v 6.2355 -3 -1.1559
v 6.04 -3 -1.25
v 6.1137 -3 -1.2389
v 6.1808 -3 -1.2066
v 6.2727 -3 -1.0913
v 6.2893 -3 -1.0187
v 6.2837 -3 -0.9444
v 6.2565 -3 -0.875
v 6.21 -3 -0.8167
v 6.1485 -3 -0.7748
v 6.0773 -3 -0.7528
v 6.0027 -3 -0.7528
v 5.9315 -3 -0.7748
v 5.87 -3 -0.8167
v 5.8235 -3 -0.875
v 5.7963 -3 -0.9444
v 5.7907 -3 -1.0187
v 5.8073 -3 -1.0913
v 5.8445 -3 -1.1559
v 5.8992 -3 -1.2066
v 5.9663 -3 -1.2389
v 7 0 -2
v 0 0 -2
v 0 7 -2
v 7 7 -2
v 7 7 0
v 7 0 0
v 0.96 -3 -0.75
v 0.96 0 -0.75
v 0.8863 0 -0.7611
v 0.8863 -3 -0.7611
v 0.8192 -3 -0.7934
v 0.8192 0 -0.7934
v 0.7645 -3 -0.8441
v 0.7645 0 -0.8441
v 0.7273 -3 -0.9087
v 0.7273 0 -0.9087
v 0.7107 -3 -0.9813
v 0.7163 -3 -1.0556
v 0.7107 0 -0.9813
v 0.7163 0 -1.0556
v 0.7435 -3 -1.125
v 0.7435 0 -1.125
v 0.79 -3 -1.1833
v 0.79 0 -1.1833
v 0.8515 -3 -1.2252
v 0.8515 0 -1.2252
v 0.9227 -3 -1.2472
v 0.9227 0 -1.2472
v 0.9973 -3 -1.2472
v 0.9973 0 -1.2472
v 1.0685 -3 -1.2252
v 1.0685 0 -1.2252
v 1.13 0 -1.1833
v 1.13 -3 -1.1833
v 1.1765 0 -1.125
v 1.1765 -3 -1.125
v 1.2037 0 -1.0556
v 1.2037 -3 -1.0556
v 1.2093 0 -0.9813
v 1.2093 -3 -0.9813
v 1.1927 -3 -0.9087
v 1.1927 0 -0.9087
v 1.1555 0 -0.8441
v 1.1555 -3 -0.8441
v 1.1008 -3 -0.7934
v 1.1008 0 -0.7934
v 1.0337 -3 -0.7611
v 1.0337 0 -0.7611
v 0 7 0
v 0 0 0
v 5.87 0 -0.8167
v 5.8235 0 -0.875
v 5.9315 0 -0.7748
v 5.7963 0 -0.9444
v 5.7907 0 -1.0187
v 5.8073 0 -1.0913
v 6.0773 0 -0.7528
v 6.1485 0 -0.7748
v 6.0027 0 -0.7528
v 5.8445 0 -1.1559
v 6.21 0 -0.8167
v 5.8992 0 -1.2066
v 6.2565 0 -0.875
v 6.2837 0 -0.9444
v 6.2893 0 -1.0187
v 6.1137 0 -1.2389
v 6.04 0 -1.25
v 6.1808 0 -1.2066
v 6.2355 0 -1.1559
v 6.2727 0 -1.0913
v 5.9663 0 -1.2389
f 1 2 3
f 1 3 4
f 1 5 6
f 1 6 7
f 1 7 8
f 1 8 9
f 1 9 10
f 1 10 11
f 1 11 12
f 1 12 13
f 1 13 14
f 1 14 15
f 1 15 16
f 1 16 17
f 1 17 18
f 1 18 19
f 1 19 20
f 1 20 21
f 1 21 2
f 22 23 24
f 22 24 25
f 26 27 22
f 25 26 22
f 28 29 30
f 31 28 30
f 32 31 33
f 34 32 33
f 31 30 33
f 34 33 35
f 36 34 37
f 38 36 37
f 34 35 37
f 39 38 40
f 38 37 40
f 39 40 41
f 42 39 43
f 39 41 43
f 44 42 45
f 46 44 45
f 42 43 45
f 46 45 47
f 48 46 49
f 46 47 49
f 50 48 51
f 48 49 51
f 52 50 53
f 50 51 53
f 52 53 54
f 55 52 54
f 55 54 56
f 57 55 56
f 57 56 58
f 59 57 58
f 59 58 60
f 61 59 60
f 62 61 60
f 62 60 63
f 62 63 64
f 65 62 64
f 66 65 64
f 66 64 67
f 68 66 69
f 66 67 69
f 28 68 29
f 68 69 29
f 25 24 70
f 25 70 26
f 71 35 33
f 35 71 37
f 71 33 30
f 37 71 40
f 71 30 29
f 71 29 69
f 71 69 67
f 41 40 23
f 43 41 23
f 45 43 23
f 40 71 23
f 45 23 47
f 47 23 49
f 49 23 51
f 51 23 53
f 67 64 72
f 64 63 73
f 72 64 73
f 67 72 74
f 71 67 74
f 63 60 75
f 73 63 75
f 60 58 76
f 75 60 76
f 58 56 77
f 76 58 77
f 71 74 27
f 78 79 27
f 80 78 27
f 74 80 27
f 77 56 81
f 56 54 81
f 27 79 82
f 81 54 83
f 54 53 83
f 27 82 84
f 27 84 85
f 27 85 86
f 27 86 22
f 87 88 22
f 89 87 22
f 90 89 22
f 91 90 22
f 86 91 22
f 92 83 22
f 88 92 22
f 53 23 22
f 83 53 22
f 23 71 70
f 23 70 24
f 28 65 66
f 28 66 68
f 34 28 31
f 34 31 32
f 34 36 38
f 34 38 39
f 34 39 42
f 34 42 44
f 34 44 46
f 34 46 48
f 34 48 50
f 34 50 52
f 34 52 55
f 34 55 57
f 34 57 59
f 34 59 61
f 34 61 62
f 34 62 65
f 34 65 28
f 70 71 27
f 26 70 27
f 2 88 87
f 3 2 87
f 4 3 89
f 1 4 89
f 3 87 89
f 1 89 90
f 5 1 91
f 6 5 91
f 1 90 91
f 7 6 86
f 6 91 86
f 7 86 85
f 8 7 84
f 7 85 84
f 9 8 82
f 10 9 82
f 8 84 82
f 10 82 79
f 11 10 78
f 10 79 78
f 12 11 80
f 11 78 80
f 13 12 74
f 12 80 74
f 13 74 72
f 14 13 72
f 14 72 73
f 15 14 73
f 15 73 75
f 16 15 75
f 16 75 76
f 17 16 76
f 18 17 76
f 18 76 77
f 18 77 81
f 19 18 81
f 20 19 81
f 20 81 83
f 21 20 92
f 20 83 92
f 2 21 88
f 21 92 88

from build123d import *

# Parameters (mm, degrees)
ESQUISSE1_W      = 7
ESQUISSE1_H      = 2
EXTRUSION1_DEPTH = 7
ESQUISSE2_R      = 0.25
EXTRUSION2_DEPTH = 3


with BuildPart() as part:
    # Esquisse1 → Extrusion1 (new body)
    with BuildSketch(Plane(origin=(0, 0, 0), x_dir=(1, 0, 0), z_dir=(0, 1, 0))):
        with Locations((3.5, 1)):
            Rectangle(ESQUISSE1_W, ESQUISSE1_H)
    extrude(amount=EXTRUSION1_DEPTH)

    # Esquisse2 → Extrusion2 (add)
    with BuildSketch(Plane.XZ):
        with Locations(Location((0.96, -1, 0), (0, 0, 90))):
            Circle(ESQUISSE2_R)
        with Locations(Location((6.04, -1, 0), (0, 0, 270))):
            Circle(ESQUISSE2_R)
    extrude(amount=EXTRUSION2_DEPTH)


solid = part.part
